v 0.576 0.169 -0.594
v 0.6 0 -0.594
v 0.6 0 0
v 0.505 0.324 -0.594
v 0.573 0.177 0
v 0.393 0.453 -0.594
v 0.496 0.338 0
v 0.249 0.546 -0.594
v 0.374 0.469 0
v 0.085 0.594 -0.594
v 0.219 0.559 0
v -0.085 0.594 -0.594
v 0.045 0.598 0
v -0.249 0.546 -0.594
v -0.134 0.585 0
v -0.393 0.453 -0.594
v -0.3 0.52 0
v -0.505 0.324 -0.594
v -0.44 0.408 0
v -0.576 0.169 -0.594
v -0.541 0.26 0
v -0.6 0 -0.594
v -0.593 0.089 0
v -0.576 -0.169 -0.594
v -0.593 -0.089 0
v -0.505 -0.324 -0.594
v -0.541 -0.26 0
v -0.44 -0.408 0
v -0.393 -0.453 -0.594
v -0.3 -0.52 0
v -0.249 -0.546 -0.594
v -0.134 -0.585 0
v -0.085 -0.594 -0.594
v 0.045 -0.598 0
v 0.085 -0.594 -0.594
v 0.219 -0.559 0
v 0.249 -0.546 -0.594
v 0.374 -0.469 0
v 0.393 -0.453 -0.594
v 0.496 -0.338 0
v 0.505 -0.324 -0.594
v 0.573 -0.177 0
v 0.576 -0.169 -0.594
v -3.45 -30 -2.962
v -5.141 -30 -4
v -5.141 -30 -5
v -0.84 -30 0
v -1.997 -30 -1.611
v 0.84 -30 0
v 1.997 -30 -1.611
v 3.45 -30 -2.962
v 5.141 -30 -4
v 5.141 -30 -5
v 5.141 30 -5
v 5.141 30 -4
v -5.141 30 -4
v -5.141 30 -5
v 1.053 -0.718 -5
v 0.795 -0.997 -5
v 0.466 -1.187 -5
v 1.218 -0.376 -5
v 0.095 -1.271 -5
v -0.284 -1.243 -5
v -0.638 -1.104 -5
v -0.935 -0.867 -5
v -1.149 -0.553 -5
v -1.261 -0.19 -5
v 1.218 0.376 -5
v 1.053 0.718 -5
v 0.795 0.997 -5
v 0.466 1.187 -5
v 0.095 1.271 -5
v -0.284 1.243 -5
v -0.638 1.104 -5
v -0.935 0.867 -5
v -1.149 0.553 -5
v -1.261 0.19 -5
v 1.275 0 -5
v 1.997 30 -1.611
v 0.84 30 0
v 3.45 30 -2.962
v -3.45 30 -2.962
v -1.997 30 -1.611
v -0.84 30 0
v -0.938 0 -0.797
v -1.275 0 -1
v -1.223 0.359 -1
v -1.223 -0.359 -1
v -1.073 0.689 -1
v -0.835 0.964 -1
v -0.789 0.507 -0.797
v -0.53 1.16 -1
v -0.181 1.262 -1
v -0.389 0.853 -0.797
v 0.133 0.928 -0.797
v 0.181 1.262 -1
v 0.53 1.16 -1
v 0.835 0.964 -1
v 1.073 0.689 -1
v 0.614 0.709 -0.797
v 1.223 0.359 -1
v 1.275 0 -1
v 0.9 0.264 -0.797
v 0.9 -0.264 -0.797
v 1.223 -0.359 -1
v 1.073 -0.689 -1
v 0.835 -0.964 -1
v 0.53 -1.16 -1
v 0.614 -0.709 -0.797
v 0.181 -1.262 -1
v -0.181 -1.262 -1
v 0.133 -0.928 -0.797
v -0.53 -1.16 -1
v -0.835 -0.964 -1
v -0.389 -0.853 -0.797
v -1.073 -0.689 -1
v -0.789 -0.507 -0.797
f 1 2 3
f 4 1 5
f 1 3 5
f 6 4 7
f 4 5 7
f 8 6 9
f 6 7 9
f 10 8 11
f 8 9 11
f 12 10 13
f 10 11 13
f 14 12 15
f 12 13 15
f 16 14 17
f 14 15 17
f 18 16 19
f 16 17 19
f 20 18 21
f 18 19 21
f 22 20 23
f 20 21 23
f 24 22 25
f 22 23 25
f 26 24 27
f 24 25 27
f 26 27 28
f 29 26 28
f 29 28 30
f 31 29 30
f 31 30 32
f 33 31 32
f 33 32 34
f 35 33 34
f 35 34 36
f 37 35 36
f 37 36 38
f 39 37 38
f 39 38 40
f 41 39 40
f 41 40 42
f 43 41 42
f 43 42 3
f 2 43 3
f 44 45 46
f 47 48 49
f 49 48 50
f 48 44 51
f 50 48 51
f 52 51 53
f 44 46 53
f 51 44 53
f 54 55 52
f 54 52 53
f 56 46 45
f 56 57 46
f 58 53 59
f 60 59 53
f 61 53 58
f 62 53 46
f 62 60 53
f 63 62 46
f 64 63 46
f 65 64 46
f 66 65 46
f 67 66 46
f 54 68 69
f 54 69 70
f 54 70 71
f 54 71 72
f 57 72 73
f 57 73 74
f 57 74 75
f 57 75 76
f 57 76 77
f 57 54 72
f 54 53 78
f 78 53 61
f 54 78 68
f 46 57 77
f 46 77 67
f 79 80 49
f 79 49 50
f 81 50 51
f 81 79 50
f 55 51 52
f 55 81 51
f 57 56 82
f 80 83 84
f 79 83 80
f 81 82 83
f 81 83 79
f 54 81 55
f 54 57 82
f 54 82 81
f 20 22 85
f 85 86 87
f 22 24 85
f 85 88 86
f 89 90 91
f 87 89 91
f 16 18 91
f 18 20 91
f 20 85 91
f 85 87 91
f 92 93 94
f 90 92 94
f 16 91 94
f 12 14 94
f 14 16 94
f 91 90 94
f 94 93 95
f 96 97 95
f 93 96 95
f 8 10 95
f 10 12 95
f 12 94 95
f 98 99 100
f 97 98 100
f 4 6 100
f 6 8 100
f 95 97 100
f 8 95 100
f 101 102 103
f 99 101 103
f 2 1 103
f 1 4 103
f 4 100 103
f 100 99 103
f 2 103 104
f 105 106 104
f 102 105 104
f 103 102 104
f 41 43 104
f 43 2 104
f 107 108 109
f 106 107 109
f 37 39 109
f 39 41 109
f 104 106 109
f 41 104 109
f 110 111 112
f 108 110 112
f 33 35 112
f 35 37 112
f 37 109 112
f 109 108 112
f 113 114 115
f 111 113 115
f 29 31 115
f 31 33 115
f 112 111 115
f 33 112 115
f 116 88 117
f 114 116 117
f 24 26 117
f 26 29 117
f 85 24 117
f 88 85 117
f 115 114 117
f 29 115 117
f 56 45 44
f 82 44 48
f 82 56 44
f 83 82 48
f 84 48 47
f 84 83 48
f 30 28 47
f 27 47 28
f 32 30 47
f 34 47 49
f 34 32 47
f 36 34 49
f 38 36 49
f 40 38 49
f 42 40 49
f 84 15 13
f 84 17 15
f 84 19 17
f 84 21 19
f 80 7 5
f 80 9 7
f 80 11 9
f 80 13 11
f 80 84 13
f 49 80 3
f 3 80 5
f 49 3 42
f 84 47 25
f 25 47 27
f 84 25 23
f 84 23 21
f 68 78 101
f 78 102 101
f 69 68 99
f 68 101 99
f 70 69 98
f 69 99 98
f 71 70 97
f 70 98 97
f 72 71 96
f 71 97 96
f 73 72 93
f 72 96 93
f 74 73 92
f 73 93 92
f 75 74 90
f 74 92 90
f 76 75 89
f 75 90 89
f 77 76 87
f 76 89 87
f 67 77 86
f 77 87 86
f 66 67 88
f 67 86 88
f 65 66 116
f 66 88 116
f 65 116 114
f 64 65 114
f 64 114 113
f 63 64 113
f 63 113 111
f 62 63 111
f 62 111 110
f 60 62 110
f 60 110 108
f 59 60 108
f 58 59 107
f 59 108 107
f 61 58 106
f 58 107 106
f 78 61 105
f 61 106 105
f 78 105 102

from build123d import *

# Parameters (mm, degrees)
BOSS_EXTRUDE1_DEPTH                       = 30
TAPPED_HOLE_FOR_M2_5X0_45_HELICOIL1_D     = 2.55
TAPPED_HOLE_FOR_M2_5X0_45_HELICOIL1_DEPTH = 4
TAPPED_HOLE_FOR_M2_5X0_45_HELICOIL1_TIP   = 0.766097289
F_1_2_1_2_DIAMETER_HOLE1_D                = 1.2
F_1_2_1_2_DIAMETER_HOLE1_DEPTH            = 6.45
F_1_2_1_2_DIAMETER_HOLE1_TIP              = 0.360516371


with BuildPart() as part:
    # Sketch1 → Boss-Extrude1 (new, symmetric)
    with BuildSketch(Plane(origin=(0, 0, 0), x_dir=(1, 0, 0), z_dir=(0, 1, 0))):
        with BuildLine():
            Line((-0.839745962, 0), (0.839745962, 0))
            ThreePointArc((0.839745962, 0), (2.690111154, 2.322937519), (5.141101056, 4))
            Line((5.141101056, 4), (5.141101056, 5))
            Line((5.141101056, 5), (-5.141101056, 5))
            Line((-5.141101056, 5), (-5.141101056, 4))
            ThreePointArc((-5.141101056, 4), (-2.690111154, 2.322937519), (-0.839745962, 0))
        make_face()
    extrude(amount=BOSS_EXTRUDE1_DEPTH, both=True)

    # Tapped Hole for M2.5x0.45 Helicoil1
    with Locations(Plane(origin=(0, 0, -5), x_dir=(-1, 0, 0), z_dir=(0, 0, -1))):
        with Locations((0, 0)):
            Hole(TAPPED_HOLE_FOR_M2_5X0_45_HELICOIL1_D / 2, depth=TAPPED_HOLE_FOR_M2_5X0_45_HELICOIL1_DEPTH)
            with Locations((0, 0, -(TAPPED_HOLE_FOR_M2_5X0_45_HELICOIL1_DEPTH + TAPPED_HOLE_FOR_M2_5X0_45_HELICOIL1_TIP / 2))):  # 118° drill point
                Cone(0, TAPPED_HOLE_FOR_M2_5X0_45_HELICOIL1_D / 2, TAPPED_HOLE_FOR_M2_5X0_45_HELICOIL1_TIP, mode=Mode.SUBTRACT)

    # Ø1.2 (1.2) Diameter Hole1
    with Locations(Plane(origin=(0, 0, -5), x_dir=(-1, 0, 0), z_dir=(0, 0, -1))):
        with Locations((0, 0)):
            Hole(F_1_2_1_2_DIAMETER_HOLE1_D / 2, depth=F_1_2_1_2_DIAMETER_HOLE1_DEPTH)
            with Locations((0, 0, -(F_1_2_1_2_DIAMETER_HOLE1_DEPTH + F_1_2_1_2_DIAMETER_HOLE1_TIP / 2))):  # 118° drill point
                Cone(0, F_1_2_1_2_DIAMETER_HOLE1_D / 2, F_1_2_1_2_DIAMETER_HOLE1_TIP, mode=Mode.SUBTRACT)


solid = part.part
